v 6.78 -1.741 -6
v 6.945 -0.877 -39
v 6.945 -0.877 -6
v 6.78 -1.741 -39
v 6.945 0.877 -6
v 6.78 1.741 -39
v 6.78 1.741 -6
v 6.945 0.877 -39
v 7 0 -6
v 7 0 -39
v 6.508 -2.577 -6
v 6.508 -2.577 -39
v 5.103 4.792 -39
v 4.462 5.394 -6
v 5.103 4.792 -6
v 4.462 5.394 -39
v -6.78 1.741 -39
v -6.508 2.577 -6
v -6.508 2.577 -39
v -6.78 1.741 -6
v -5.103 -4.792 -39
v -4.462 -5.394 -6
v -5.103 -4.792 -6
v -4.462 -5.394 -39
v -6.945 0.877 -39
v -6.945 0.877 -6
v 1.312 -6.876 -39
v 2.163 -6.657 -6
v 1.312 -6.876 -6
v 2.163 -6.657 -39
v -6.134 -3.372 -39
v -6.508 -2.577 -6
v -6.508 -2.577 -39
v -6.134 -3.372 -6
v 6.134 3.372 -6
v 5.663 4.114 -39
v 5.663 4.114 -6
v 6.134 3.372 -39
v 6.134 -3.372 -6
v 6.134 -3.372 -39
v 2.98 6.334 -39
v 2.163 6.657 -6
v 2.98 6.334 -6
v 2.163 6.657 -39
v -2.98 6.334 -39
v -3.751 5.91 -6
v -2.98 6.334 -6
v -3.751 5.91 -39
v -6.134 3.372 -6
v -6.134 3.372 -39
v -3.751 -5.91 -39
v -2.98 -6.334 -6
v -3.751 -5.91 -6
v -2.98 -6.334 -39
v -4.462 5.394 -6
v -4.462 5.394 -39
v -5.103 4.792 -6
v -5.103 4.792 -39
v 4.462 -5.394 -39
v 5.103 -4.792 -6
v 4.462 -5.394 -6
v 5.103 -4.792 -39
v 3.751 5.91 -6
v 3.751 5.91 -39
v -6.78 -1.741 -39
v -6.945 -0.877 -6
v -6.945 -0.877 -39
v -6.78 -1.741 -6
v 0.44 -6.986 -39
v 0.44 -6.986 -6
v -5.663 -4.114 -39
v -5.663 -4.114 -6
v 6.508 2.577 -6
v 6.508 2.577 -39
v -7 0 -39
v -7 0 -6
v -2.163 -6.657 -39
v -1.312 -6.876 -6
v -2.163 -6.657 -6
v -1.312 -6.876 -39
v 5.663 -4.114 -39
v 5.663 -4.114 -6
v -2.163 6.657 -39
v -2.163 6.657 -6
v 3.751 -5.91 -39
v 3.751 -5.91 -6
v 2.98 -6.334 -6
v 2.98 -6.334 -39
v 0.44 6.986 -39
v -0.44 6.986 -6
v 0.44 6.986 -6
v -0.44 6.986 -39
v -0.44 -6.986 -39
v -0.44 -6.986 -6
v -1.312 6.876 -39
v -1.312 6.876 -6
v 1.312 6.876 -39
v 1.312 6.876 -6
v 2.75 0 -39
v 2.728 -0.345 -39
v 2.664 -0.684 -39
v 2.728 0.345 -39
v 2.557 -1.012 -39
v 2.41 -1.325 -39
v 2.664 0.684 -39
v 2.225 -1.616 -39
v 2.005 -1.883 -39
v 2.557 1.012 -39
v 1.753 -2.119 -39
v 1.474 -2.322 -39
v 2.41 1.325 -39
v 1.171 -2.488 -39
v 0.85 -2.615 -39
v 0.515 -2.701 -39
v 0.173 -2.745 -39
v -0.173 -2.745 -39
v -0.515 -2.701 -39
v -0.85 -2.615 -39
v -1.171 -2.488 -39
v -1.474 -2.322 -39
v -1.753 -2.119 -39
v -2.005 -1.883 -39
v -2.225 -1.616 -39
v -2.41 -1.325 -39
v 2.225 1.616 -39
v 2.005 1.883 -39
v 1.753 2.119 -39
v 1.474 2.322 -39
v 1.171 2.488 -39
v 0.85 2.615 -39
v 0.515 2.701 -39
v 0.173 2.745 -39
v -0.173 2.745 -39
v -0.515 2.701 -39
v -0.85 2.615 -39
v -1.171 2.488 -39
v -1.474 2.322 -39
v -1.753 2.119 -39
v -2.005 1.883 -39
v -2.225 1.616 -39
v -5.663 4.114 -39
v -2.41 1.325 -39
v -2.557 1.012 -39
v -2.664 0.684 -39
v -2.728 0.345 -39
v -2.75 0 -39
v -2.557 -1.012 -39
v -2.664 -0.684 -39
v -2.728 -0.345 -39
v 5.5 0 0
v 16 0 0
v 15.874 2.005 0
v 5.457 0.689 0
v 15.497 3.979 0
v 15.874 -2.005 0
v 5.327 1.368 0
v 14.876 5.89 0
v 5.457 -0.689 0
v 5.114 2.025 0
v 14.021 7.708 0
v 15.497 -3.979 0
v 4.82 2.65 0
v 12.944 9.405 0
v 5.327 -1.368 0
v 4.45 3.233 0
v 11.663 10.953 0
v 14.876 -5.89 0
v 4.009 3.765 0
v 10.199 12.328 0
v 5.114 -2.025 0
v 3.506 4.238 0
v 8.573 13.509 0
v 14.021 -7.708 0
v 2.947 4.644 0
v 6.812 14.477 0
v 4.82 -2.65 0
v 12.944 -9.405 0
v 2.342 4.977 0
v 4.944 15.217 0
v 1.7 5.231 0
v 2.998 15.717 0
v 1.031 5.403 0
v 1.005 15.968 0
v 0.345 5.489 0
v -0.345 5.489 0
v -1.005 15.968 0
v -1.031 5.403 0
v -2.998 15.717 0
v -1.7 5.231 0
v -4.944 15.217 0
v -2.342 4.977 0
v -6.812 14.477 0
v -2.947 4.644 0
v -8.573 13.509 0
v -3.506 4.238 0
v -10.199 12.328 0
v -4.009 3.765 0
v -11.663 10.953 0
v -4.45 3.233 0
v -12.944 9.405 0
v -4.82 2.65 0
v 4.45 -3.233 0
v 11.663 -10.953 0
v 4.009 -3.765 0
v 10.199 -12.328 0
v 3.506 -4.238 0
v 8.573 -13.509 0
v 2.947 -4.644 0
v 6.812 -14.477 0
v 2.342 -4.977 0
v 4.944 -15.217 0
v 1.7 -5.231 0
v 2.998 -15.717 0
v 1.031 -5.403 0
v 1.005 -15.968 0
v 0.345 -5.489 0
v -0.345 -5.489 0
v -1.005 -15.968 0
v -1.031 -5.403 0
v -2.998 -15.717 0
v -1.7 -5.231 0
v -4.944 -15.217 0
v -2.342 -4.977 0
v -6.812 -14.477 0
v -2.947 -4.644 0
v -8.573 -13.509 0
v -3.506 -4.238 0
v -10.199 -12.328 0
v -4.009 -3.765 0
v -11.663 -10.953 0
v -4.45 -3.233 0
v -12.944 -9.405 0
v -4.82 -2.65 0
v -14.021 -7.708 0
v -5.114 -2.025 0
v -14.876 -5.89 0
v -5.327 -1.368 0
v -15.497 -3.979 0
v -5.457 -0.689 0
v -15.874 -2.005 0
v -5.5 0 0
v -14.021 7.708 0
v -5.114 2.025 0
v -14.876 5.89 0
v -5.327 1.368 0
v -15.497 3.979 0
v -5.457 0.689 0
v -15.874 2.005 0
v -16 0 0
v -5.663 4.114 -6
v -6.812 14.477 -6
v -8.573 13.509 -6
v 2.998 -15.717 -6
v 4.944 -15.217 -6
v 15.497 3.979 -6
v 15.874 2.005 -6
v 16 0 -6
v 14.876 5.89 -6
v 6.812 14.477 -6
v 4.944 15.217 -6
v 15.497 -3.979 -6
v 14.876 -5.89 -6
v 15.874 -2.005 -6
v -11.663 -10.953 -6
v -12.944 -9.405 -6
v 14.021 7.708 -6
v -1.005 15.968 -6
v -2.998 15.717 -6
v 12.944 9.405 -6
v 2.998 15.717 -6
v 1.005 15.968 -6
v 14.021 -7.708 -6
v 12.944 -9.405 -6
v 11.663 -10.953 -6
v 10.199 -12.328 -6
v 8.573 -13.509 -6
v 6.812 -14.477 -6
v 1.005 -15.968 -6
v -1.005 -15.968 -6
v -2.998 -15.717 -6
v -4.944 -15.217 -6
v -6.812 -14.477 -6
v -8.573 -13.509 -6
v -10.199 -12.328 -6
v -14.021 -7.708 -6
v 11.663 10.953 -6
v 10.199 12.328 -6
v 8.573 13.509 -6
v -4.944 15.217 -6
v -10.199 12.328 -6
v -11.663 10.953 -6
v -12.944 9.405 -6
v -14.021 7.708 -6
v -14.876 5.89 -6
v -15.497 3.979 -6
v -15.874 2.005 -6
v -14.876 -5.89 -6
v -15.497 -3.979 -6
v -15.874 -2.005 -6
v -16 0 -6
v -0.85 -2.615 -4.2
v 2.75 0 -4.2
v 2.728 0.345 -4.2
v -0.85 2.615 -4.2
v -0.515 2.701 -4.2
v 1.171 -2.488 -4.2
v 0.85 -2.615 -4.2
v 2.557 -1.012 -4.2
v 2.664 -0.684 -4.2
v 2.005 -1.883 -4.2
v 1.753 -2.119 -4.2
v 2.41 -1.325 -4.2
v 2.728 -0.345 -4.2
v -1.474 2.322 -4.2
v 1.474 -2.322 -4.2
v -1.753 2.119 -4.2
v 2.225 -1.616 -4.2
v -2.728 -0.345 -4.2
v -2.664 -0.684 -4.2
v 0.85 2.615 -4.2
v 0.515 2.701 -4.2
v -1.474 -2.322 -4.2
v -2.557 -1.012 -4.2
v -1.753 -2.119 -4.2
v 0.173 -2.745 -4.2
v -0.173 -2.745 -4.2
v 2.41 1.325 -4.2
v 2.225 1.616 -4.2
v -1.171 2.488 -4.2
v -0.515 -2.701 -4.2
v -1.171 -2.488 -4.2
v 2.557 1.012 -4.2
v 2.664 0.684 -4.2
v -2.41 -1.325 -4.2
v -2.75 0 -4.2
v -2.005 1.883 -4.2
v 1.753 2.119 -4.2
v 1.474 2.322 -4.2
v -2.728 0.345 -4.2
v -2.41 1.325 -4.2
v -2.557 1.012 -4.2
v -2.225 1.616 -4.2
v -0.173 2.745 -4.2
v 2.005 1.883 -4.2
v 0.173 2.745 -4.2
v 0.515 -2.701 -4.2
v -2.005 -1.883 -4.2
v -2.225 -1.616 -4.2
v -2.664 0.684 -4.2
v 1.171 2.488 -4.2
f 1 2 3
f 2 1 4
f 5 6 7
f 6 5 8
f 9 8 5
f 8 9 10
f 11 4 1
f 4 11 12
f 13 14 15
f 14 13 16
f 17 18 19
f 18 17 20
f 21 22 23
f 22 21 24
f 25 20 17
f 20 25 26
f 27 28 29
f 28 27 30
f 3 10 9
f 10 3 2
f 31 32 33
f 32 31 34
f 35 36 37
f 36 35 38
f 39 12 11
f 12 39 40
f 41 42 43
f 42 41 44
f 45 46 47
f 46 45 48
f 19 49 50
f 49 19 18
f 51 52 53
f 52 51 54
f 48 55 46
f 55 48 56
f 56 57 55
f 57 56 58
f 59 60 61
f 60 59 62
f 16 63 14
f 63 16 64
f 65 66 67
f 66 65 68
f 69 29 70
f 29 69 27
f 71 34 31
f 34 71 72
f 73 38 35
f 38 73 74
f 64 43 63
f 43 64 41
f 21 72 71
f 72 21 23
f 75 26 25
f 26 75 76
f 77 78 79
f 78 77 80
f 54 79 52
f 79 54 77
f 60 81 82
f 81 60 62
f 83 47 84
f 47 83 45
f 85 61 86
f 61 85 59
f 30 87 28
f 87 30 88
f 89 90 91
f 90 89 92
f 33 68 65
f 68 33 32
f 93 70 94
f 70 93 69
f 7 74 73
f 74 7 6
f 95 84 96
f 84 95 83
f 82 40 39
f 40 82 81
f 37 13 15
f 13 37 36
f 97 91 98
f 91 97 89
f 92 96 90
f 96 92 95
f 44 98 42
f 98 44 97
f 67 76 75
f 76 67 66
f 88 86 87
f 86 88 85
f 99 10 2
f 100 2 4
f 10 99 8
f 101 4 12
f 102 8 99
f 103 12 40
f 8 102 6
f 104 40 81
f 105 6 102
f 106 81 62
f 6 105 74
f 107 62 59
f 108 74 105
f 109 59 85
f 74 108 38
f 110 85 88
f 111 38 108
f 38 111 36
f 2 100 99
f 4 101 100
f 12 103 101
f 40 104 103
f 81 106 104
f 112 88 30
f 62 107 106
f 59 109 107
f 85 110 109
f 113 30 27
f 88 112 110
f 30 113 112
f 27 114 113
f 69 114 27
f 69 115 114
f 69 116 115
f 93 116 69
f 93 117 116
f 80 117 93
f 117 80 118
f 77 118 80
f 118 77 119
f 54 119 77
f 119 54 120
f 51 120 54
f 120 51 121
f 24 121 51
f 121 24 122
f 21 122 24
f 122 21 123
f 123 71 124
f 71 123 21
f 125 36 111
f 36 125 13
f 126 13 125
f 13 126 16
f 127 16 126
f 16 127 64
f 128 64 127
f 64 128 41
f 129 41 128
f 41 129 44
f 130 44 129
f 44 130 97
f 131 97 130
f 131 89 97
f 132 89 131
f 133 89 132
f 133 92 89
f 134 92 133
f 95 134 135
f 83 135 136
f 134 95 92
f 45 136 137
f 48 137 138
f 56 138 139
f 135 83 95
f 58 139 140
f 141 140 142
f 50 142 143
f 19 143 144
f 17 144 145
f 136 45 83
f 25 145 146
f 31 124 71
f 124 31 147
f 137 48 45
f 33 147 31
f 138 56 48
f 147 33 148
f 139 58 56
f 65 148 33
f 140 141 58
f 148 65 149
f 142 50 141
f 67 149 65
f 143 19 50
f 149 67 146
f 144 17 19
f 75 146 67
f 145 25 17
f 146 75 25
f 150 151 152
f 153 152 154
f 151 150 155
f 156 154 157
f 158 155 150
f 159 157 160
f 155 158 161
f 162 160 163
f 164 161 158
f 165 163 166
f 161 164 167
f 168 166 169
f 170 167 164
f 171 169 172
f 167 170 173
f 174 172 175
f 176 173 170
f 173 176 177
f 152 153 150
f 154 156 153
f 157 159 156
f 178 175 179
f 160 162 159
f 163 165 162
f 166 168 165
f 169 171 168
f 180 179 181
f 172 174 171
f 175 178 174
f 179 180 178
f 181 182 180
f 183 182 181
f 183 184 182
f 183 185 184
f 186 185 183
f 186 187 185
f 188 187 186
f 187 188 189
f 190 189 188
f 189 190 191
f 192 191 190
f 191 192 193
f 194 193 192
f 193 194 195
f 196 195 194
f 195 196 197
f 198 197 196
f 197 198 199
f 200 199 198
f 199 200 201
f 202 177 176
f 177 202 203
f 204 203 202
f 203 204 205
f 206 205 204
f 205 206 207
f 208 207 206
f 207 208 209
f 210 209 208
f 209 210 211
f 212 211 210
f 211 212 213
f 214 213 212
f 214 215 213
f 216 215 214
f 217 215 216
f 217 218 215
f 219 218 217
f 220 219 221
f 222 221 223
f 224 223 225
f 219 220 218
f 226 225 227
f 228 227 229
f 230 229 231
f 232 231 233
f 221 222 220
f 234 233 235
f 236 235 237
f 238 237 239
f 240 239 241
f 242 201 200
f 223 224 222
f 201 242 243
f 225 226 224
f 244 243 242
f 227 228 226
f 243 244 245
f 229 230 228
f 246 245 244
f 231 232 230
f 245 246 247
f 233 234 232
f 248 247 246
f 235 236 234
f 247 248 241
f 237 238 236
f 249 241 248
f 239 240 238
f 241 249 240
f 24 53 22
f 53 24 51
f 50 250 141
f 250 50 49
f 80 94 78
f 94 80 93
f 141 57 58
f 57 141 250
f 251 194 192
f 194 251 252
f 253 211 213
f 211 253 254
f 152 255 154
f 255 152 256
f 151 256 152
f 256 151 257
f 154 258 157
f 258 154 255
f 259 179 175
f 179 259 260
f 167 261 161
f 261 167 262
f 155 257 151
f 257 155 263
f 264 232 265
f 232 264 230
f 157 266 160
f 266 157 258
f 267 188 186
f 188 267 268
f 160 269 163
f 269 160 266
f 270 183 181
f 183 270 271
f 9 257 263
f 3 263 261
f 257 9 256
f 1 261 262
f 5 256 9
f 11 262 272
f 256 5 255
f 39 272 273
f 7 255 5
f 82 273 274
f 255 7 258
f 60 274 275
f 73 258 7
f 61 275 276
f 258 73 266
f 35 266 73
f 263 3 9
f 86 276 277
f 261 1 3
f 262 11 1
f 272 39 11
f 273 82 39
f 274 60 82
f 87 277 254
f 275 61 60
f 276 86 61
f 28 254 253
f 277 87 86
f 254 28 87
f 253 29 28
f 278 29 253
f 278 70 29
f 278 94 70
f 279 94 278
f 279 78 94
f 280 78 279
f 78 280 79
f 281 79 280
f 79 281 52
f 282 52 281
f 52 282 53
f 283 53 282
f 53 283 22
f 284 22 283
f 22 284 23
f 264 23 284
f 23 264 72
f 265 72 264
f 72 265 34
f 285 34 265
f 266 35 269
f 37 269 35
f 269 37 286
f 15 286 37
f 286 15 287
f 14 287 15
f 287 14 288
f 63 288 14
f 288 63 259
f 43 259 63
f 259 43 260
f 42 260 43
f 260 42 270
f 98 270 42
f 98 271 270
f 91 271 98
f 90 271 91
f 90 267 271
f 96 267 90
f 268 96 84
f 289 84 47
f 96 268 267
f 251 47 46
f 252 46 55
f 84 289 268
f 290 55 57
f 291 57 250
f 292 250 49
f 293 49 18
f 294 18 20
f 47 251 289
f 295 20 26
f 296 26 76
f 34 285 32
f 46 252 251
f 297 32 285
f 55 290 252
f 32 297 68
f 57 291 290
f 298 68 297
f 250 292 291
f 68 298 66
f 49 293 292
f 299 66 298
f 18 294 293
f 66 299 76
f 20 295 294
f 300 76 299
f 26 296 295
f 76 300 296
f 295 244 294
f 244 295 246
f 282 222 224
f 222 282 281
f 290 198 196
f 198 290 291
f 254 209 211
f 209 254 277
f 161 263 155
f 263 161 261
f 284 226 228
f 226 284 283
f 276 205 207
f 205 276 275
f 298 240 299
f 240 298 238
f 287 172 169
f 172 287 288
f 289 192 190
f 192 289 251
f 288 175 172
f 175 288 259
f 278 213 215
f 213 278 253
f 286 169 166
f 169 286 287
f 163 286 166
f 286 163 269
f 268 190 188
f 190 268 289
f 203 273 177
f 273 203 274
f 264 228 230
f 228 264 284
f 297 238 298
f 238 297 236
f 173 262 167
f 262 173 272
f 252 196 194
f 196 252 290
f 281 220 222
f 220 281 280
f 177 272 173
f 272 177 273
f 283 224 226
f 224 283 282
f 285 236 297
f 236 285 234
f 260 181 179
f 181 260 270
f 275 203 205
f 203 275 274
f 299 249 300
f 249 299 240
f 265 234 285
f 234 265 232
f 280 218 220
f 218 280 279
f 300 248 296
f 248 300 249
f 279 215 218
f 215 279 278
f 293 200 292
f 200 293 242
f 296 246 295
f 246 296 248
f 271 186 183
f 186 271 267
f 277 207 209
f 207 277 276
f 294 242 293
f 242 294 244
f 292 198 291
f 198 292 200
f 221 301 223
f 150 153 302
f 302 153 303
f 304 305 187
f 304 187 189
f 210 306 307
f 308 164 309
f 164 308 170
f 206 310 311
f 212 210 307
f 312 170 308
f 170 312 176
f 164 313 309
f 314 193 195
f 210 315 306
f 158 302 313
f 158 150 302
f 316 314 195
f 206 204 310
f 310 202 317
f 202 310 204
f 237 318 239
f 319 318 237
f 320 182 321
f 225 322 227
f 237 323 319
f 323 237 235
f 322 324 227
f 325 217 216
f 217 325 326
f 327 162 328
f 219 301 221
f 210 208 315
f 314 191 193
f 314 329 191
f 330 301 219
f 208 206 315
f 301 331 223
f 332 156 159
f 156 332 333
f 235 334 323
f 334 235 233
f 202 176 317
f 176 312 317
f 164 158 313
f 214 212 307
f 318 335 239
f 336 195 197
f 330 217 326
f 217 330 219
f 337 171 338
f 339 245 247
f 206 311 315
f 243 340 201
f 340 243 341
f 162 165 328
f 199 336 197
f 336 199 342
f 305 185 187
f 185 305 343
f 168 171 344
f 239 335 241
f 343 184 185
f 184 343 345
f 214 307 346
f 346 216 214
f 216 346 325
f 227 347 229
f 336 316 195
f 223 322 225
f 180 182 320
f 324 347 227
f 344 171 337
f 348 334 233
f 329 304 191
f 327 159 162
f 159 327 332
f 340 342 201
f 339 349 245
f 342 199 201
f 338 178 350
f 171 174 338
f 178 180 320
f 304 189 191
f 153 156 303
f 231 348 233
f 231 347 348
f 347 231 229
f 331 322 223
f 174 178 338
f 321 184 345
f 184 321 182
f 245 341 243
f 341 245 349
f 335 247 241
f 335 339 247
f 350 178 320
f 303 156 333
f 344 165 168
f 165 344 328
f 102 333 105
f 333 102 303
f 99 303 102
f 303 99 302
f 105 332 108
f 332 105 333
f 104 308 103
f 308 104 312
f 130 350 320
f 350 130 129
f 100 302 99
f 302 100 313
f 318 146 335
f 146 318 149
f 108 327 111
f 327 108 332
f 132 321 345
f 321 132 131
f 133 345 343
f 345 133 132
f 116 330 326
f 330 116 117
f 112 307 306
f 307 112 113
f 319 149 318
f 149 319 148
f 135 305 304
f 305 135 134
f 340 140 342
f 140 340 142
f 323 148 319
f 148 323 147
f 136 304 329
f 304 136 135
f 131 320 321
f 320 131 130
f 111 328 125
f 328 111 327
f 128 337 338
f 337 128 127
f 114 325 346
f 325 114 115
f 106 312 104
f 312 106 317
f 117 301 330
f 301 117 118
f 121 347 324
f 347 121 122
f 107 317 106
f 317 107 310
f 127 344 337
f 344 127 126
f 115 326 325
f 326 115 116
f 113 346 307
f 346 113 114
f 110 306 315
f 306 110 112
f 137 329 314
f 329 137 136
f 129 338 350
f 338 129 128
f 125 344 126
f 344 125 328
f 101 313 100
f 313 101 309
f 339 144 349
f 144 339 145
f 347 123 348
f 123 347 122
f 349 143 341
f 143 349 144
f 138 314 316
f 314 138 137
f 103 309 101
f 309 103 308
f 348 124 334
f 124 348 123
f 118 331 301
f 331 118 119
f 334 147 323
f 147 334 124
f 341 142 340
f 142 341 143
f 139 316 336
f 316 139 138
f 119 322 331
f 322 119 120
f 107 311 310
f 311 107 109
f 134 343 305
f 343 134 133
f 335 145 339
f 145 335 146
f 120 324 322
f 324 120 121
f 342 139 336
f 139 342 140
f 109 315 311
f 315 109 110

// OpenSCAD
$fn = 50;


difference() {
	union() {
		translate(v = [0, 0, -39.0000000000]) {
			cylinder(h = 39, r = 7.0000000000);
		}
		translate(v = [0, 0, -6.0000000000]) {
			cylinder(h = 6, r = 16.0000000000);
		}
	}
	union() {
		translate(v = [0, 0, 0]) {
			rotate(a = [0, 0, 0]) {
				difference() {
					union() {
						#translate(v = [0, 0, -39.0000000000]) {
							cylinder(h = 39, r = 2.2500000000);
						}
						#translate(v = [0, 0, -4.2000000000]) {
							cylinder(h = 4.2000000000, r = 7.0000000000, r1 = 2.7500000000, r2 = 5.5000000000);
						}
						#translate(v = [0, 0, -39.0000000000]) {
							cylinder(h = 39, r = 2.7500000000);
						}
						#translate(v = [0, 0, -39.0000000000]) {
							cylinder(h = 39, r = 2.2500000000);
						}
					}
					union();
				}
			}
		}
	}
}
